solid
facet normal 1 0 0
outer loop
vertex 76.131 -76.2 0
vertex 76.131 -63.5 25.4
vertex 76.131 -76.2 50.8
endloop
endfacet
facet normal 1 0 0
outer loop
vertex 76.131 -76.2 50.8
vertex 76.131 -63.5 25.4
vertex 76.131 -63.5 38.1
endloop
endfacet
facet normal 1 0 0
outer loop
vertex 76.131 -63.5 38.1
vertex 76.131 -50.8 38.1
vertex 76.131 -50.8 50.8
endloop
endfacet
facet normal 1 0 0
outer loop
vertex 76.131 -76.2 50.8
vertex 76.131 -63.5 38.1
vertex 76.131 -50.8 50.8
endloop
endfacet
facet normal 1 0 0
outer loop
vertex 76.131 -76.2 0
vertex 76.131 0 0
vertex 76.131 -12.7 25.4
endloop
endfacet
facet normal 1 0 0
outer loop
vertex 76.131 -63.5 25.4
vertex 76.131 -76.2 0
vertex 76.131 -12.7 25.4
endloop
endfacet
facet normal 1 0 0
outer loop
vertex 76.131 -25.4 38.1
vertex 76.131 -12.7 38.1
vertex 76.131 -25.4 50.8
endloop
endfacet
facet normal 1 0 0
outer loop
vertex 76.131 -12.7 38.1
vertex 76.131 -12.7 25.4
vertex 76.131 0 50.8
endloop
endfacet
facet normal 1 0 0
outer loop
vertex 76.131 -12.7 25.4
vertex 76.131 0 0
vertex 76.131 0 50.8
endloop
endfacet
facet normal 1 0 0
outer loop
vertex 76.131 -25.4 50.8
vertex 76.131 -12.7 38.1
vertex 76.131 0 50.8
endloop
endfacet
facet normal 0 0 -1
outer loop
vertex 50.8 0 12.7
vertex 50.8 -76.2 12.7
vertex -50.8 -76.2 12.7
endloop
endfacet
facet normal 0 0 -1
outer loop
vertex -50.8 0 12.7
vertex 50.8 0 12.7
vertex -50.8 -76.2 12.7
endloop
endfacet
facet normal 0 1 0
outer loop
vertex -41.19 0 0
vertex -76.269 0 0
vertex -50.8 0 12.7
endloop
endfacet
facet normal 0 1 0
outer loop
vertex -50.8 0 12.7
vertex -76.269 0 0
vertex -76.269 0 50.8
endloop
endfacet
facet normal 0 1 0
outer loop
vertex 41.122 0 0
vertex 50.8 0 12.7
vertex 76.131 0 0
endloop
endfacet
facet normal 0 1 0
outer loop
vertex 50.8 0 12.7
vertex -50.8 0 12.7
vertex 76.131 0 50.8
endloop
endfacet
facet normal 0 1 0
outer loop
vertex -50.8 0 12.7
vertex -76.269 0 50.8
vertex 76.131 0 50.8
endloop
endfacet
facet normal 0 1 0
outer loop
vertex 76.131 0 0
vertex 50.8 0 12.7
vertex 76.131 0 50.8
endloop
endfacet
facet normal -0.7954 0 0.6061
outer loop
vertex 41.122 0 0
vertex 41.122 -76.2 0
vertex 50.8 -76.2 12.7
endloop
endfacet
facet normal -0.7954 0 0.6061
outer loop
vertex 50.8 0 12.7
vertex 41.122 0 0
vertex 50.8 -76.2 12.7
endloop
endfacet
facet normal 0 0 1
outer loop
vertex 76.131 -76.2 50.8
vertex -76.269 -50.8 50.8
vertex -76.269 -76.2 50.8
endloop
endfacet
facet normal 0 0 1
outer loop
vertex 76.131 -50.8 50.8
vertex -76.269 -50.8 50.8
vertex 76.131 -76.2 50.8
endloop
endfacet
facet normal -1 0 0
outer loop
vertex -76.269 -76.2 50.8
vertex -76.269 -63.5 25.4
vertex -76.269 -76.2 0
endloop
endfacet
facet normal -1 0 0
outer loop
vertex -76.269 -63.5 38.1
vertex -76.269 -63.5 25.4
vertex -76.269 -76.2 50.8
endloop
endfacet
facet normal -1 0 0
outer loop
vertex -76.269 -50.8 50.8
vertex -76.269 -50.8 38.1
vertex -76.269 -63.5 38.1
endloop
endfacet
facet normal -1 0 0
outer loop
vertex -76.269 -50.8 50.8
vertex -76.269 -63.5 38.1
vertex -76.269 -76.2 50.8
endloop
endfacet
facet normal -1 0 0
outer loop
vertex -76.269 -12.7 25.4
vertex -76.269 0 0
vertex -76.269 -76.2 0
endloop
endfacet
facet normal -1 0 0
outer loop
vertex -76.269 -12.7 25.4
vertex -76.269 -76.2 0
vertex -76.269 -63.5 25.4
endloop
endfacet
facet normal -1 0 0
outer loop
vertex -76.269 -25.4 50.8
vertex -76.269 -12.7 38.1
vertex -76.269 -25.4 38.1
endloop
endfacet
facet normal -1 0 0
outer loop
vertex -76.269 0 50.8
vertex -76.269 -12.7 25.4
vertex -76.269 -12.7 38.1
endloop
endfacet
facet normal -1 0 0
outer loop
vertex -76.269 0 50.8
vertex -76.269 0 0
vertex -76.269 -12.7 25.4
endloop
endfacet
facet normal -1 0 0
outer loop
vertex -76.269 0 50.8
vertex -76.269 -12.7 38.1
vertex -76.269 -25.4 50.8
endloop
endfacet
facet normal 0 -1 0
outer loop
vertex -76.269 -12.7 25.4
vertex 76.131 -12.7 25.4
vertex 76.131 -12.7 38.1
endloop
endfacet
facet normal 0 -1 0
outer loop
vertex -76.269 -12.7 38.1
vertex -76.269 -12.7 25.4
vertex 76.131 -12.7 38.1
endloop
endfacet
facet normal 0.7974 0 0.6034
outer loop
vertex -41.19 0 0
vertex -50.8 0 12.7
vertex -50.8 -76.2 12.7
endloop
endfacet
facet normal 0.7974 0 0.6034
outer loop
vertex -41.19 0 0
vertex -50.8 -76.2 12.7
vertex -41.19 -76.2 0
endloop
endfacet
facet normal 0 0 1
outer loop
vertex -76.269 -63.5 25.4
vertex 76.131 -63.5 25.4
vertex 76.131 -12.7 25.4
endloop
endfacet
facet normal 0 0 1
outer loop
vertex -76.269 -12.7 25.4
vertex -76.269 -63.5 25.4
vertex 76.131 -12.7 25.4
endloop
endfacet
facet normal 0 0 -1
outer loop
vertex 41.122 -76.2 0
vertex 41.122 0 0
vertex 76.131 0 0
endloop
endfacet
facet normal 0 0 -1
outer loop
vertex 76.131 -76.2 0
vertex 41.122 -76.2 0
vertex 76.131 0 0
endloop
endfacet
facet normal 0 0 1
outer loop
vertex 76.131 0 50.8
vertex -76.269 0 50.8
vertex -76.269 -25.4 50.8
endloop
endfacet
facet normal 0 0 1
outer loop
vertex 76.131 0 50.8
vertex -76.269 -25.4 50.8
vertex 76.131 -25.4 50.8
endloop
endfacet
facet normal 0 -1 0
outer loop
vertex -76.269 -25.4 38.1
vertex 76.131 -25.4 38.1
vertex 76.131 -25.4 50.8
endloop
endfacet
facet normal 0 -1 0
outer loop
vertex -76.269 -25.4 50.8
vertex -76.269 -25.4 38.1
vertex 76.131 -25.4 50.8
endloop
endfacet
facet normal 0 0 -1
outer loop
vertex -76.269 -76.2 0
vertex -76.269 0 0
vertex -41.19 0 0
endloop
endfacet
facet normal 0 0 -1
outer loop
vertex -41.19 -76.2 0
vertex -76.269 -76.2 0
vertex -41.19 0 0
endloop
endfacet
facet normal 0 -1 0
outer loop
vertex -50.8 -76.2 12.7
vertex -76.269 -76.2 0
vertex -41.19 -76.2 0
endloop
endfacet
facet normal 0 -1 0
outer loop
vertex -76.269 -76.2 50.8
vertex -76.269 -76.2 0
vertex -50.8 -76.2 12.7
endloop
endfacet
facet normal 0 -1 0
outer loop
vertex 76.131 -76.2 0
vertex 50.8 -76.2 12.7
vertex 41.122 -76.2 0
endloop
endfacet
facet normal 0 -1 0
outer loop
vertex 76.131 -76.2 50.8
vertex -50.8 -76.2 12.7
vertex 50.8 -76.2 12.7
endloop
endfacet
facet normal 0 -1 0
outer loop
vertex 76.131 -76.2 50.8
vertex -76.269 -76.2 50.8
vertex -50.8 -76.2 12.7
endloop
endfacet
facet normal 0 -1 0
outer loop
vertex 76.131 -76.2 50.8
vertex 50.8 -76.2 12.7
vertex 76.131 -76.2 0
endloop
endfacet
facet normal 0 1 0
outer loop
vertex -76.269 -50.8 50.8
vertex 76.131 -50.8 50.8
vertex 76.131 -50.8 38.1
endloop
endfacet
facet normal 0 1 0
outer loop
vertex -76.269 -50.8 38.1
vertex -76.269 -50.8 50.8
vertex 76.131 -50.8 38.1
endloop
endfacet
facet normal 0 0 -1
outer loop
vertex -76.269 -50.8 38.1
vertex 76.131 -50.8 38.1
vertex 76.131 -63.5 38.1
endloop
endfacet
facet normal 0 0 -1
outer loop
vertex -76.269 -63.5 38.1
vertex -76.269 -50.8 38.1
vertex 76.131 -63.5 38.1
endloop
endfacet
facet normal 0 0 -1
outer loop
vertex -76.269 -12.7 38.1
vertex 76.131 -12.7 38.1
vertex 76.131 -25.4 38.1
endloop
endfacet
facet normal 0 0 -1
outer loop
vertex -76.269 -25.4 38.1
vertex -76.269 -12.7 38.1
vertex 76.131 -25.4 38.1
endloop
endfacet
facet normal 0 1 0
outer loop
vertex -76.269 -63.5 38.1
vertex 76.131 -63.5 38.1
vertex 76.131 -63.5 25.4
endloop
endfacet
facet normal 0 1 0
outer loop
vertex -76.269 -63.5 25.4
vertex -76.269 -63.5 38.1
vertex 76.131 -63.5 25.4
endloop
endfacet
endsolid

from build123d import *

# Parameters (mm, degrees)
F0_W     = 152.4
F0_H     = 50.8
F1_DEPTH = 76.2
F3_DEPTH = 76.2
F5_DEPTH = 152.4


with BuildPart() as f1:
    # F0 (on Front) → F1 (new body)
    with BuildSketch(Plane.XZ):
        with Locations((-0.068524, 25.4)):
            Rectangle(F0_W, F0_H)
    extrude(amount=F1_DEPTH)

    # F2 (on face) → F3 (cut, through all)
    with BuildSketch(Plane.XZ.offset(76.2)):
        Polygon((0, 12.7), (0, 0), (41.121963, 0), (50.8, 12.7), align=None)
        Polygon((-41.190486, 0), (0, 0), (0, 12.7), (-50.8, 12.7), align=None)
    extrude(amount=-F3_DEPTH, mode=Mode.SUBTRACT)

    # F4 (on face) → F5 (cut, through all)
    with BuildSketch(Plane.YZ.offset(76.131476)):
        Polygon((-63.5, 25.4), (-12.7, 25.4), (-12.7, 38.1), (-25.4, 38.1), (-25.4, 50.8), (-49.570005, 50.8), (-50.8, 50.8), (-50.8, 38.1), (-63.5, 38.1), align=None)
    extrude(amount=-F5_DEPTH, mode=Mode.SUBTRACT)


solid = f1.part
